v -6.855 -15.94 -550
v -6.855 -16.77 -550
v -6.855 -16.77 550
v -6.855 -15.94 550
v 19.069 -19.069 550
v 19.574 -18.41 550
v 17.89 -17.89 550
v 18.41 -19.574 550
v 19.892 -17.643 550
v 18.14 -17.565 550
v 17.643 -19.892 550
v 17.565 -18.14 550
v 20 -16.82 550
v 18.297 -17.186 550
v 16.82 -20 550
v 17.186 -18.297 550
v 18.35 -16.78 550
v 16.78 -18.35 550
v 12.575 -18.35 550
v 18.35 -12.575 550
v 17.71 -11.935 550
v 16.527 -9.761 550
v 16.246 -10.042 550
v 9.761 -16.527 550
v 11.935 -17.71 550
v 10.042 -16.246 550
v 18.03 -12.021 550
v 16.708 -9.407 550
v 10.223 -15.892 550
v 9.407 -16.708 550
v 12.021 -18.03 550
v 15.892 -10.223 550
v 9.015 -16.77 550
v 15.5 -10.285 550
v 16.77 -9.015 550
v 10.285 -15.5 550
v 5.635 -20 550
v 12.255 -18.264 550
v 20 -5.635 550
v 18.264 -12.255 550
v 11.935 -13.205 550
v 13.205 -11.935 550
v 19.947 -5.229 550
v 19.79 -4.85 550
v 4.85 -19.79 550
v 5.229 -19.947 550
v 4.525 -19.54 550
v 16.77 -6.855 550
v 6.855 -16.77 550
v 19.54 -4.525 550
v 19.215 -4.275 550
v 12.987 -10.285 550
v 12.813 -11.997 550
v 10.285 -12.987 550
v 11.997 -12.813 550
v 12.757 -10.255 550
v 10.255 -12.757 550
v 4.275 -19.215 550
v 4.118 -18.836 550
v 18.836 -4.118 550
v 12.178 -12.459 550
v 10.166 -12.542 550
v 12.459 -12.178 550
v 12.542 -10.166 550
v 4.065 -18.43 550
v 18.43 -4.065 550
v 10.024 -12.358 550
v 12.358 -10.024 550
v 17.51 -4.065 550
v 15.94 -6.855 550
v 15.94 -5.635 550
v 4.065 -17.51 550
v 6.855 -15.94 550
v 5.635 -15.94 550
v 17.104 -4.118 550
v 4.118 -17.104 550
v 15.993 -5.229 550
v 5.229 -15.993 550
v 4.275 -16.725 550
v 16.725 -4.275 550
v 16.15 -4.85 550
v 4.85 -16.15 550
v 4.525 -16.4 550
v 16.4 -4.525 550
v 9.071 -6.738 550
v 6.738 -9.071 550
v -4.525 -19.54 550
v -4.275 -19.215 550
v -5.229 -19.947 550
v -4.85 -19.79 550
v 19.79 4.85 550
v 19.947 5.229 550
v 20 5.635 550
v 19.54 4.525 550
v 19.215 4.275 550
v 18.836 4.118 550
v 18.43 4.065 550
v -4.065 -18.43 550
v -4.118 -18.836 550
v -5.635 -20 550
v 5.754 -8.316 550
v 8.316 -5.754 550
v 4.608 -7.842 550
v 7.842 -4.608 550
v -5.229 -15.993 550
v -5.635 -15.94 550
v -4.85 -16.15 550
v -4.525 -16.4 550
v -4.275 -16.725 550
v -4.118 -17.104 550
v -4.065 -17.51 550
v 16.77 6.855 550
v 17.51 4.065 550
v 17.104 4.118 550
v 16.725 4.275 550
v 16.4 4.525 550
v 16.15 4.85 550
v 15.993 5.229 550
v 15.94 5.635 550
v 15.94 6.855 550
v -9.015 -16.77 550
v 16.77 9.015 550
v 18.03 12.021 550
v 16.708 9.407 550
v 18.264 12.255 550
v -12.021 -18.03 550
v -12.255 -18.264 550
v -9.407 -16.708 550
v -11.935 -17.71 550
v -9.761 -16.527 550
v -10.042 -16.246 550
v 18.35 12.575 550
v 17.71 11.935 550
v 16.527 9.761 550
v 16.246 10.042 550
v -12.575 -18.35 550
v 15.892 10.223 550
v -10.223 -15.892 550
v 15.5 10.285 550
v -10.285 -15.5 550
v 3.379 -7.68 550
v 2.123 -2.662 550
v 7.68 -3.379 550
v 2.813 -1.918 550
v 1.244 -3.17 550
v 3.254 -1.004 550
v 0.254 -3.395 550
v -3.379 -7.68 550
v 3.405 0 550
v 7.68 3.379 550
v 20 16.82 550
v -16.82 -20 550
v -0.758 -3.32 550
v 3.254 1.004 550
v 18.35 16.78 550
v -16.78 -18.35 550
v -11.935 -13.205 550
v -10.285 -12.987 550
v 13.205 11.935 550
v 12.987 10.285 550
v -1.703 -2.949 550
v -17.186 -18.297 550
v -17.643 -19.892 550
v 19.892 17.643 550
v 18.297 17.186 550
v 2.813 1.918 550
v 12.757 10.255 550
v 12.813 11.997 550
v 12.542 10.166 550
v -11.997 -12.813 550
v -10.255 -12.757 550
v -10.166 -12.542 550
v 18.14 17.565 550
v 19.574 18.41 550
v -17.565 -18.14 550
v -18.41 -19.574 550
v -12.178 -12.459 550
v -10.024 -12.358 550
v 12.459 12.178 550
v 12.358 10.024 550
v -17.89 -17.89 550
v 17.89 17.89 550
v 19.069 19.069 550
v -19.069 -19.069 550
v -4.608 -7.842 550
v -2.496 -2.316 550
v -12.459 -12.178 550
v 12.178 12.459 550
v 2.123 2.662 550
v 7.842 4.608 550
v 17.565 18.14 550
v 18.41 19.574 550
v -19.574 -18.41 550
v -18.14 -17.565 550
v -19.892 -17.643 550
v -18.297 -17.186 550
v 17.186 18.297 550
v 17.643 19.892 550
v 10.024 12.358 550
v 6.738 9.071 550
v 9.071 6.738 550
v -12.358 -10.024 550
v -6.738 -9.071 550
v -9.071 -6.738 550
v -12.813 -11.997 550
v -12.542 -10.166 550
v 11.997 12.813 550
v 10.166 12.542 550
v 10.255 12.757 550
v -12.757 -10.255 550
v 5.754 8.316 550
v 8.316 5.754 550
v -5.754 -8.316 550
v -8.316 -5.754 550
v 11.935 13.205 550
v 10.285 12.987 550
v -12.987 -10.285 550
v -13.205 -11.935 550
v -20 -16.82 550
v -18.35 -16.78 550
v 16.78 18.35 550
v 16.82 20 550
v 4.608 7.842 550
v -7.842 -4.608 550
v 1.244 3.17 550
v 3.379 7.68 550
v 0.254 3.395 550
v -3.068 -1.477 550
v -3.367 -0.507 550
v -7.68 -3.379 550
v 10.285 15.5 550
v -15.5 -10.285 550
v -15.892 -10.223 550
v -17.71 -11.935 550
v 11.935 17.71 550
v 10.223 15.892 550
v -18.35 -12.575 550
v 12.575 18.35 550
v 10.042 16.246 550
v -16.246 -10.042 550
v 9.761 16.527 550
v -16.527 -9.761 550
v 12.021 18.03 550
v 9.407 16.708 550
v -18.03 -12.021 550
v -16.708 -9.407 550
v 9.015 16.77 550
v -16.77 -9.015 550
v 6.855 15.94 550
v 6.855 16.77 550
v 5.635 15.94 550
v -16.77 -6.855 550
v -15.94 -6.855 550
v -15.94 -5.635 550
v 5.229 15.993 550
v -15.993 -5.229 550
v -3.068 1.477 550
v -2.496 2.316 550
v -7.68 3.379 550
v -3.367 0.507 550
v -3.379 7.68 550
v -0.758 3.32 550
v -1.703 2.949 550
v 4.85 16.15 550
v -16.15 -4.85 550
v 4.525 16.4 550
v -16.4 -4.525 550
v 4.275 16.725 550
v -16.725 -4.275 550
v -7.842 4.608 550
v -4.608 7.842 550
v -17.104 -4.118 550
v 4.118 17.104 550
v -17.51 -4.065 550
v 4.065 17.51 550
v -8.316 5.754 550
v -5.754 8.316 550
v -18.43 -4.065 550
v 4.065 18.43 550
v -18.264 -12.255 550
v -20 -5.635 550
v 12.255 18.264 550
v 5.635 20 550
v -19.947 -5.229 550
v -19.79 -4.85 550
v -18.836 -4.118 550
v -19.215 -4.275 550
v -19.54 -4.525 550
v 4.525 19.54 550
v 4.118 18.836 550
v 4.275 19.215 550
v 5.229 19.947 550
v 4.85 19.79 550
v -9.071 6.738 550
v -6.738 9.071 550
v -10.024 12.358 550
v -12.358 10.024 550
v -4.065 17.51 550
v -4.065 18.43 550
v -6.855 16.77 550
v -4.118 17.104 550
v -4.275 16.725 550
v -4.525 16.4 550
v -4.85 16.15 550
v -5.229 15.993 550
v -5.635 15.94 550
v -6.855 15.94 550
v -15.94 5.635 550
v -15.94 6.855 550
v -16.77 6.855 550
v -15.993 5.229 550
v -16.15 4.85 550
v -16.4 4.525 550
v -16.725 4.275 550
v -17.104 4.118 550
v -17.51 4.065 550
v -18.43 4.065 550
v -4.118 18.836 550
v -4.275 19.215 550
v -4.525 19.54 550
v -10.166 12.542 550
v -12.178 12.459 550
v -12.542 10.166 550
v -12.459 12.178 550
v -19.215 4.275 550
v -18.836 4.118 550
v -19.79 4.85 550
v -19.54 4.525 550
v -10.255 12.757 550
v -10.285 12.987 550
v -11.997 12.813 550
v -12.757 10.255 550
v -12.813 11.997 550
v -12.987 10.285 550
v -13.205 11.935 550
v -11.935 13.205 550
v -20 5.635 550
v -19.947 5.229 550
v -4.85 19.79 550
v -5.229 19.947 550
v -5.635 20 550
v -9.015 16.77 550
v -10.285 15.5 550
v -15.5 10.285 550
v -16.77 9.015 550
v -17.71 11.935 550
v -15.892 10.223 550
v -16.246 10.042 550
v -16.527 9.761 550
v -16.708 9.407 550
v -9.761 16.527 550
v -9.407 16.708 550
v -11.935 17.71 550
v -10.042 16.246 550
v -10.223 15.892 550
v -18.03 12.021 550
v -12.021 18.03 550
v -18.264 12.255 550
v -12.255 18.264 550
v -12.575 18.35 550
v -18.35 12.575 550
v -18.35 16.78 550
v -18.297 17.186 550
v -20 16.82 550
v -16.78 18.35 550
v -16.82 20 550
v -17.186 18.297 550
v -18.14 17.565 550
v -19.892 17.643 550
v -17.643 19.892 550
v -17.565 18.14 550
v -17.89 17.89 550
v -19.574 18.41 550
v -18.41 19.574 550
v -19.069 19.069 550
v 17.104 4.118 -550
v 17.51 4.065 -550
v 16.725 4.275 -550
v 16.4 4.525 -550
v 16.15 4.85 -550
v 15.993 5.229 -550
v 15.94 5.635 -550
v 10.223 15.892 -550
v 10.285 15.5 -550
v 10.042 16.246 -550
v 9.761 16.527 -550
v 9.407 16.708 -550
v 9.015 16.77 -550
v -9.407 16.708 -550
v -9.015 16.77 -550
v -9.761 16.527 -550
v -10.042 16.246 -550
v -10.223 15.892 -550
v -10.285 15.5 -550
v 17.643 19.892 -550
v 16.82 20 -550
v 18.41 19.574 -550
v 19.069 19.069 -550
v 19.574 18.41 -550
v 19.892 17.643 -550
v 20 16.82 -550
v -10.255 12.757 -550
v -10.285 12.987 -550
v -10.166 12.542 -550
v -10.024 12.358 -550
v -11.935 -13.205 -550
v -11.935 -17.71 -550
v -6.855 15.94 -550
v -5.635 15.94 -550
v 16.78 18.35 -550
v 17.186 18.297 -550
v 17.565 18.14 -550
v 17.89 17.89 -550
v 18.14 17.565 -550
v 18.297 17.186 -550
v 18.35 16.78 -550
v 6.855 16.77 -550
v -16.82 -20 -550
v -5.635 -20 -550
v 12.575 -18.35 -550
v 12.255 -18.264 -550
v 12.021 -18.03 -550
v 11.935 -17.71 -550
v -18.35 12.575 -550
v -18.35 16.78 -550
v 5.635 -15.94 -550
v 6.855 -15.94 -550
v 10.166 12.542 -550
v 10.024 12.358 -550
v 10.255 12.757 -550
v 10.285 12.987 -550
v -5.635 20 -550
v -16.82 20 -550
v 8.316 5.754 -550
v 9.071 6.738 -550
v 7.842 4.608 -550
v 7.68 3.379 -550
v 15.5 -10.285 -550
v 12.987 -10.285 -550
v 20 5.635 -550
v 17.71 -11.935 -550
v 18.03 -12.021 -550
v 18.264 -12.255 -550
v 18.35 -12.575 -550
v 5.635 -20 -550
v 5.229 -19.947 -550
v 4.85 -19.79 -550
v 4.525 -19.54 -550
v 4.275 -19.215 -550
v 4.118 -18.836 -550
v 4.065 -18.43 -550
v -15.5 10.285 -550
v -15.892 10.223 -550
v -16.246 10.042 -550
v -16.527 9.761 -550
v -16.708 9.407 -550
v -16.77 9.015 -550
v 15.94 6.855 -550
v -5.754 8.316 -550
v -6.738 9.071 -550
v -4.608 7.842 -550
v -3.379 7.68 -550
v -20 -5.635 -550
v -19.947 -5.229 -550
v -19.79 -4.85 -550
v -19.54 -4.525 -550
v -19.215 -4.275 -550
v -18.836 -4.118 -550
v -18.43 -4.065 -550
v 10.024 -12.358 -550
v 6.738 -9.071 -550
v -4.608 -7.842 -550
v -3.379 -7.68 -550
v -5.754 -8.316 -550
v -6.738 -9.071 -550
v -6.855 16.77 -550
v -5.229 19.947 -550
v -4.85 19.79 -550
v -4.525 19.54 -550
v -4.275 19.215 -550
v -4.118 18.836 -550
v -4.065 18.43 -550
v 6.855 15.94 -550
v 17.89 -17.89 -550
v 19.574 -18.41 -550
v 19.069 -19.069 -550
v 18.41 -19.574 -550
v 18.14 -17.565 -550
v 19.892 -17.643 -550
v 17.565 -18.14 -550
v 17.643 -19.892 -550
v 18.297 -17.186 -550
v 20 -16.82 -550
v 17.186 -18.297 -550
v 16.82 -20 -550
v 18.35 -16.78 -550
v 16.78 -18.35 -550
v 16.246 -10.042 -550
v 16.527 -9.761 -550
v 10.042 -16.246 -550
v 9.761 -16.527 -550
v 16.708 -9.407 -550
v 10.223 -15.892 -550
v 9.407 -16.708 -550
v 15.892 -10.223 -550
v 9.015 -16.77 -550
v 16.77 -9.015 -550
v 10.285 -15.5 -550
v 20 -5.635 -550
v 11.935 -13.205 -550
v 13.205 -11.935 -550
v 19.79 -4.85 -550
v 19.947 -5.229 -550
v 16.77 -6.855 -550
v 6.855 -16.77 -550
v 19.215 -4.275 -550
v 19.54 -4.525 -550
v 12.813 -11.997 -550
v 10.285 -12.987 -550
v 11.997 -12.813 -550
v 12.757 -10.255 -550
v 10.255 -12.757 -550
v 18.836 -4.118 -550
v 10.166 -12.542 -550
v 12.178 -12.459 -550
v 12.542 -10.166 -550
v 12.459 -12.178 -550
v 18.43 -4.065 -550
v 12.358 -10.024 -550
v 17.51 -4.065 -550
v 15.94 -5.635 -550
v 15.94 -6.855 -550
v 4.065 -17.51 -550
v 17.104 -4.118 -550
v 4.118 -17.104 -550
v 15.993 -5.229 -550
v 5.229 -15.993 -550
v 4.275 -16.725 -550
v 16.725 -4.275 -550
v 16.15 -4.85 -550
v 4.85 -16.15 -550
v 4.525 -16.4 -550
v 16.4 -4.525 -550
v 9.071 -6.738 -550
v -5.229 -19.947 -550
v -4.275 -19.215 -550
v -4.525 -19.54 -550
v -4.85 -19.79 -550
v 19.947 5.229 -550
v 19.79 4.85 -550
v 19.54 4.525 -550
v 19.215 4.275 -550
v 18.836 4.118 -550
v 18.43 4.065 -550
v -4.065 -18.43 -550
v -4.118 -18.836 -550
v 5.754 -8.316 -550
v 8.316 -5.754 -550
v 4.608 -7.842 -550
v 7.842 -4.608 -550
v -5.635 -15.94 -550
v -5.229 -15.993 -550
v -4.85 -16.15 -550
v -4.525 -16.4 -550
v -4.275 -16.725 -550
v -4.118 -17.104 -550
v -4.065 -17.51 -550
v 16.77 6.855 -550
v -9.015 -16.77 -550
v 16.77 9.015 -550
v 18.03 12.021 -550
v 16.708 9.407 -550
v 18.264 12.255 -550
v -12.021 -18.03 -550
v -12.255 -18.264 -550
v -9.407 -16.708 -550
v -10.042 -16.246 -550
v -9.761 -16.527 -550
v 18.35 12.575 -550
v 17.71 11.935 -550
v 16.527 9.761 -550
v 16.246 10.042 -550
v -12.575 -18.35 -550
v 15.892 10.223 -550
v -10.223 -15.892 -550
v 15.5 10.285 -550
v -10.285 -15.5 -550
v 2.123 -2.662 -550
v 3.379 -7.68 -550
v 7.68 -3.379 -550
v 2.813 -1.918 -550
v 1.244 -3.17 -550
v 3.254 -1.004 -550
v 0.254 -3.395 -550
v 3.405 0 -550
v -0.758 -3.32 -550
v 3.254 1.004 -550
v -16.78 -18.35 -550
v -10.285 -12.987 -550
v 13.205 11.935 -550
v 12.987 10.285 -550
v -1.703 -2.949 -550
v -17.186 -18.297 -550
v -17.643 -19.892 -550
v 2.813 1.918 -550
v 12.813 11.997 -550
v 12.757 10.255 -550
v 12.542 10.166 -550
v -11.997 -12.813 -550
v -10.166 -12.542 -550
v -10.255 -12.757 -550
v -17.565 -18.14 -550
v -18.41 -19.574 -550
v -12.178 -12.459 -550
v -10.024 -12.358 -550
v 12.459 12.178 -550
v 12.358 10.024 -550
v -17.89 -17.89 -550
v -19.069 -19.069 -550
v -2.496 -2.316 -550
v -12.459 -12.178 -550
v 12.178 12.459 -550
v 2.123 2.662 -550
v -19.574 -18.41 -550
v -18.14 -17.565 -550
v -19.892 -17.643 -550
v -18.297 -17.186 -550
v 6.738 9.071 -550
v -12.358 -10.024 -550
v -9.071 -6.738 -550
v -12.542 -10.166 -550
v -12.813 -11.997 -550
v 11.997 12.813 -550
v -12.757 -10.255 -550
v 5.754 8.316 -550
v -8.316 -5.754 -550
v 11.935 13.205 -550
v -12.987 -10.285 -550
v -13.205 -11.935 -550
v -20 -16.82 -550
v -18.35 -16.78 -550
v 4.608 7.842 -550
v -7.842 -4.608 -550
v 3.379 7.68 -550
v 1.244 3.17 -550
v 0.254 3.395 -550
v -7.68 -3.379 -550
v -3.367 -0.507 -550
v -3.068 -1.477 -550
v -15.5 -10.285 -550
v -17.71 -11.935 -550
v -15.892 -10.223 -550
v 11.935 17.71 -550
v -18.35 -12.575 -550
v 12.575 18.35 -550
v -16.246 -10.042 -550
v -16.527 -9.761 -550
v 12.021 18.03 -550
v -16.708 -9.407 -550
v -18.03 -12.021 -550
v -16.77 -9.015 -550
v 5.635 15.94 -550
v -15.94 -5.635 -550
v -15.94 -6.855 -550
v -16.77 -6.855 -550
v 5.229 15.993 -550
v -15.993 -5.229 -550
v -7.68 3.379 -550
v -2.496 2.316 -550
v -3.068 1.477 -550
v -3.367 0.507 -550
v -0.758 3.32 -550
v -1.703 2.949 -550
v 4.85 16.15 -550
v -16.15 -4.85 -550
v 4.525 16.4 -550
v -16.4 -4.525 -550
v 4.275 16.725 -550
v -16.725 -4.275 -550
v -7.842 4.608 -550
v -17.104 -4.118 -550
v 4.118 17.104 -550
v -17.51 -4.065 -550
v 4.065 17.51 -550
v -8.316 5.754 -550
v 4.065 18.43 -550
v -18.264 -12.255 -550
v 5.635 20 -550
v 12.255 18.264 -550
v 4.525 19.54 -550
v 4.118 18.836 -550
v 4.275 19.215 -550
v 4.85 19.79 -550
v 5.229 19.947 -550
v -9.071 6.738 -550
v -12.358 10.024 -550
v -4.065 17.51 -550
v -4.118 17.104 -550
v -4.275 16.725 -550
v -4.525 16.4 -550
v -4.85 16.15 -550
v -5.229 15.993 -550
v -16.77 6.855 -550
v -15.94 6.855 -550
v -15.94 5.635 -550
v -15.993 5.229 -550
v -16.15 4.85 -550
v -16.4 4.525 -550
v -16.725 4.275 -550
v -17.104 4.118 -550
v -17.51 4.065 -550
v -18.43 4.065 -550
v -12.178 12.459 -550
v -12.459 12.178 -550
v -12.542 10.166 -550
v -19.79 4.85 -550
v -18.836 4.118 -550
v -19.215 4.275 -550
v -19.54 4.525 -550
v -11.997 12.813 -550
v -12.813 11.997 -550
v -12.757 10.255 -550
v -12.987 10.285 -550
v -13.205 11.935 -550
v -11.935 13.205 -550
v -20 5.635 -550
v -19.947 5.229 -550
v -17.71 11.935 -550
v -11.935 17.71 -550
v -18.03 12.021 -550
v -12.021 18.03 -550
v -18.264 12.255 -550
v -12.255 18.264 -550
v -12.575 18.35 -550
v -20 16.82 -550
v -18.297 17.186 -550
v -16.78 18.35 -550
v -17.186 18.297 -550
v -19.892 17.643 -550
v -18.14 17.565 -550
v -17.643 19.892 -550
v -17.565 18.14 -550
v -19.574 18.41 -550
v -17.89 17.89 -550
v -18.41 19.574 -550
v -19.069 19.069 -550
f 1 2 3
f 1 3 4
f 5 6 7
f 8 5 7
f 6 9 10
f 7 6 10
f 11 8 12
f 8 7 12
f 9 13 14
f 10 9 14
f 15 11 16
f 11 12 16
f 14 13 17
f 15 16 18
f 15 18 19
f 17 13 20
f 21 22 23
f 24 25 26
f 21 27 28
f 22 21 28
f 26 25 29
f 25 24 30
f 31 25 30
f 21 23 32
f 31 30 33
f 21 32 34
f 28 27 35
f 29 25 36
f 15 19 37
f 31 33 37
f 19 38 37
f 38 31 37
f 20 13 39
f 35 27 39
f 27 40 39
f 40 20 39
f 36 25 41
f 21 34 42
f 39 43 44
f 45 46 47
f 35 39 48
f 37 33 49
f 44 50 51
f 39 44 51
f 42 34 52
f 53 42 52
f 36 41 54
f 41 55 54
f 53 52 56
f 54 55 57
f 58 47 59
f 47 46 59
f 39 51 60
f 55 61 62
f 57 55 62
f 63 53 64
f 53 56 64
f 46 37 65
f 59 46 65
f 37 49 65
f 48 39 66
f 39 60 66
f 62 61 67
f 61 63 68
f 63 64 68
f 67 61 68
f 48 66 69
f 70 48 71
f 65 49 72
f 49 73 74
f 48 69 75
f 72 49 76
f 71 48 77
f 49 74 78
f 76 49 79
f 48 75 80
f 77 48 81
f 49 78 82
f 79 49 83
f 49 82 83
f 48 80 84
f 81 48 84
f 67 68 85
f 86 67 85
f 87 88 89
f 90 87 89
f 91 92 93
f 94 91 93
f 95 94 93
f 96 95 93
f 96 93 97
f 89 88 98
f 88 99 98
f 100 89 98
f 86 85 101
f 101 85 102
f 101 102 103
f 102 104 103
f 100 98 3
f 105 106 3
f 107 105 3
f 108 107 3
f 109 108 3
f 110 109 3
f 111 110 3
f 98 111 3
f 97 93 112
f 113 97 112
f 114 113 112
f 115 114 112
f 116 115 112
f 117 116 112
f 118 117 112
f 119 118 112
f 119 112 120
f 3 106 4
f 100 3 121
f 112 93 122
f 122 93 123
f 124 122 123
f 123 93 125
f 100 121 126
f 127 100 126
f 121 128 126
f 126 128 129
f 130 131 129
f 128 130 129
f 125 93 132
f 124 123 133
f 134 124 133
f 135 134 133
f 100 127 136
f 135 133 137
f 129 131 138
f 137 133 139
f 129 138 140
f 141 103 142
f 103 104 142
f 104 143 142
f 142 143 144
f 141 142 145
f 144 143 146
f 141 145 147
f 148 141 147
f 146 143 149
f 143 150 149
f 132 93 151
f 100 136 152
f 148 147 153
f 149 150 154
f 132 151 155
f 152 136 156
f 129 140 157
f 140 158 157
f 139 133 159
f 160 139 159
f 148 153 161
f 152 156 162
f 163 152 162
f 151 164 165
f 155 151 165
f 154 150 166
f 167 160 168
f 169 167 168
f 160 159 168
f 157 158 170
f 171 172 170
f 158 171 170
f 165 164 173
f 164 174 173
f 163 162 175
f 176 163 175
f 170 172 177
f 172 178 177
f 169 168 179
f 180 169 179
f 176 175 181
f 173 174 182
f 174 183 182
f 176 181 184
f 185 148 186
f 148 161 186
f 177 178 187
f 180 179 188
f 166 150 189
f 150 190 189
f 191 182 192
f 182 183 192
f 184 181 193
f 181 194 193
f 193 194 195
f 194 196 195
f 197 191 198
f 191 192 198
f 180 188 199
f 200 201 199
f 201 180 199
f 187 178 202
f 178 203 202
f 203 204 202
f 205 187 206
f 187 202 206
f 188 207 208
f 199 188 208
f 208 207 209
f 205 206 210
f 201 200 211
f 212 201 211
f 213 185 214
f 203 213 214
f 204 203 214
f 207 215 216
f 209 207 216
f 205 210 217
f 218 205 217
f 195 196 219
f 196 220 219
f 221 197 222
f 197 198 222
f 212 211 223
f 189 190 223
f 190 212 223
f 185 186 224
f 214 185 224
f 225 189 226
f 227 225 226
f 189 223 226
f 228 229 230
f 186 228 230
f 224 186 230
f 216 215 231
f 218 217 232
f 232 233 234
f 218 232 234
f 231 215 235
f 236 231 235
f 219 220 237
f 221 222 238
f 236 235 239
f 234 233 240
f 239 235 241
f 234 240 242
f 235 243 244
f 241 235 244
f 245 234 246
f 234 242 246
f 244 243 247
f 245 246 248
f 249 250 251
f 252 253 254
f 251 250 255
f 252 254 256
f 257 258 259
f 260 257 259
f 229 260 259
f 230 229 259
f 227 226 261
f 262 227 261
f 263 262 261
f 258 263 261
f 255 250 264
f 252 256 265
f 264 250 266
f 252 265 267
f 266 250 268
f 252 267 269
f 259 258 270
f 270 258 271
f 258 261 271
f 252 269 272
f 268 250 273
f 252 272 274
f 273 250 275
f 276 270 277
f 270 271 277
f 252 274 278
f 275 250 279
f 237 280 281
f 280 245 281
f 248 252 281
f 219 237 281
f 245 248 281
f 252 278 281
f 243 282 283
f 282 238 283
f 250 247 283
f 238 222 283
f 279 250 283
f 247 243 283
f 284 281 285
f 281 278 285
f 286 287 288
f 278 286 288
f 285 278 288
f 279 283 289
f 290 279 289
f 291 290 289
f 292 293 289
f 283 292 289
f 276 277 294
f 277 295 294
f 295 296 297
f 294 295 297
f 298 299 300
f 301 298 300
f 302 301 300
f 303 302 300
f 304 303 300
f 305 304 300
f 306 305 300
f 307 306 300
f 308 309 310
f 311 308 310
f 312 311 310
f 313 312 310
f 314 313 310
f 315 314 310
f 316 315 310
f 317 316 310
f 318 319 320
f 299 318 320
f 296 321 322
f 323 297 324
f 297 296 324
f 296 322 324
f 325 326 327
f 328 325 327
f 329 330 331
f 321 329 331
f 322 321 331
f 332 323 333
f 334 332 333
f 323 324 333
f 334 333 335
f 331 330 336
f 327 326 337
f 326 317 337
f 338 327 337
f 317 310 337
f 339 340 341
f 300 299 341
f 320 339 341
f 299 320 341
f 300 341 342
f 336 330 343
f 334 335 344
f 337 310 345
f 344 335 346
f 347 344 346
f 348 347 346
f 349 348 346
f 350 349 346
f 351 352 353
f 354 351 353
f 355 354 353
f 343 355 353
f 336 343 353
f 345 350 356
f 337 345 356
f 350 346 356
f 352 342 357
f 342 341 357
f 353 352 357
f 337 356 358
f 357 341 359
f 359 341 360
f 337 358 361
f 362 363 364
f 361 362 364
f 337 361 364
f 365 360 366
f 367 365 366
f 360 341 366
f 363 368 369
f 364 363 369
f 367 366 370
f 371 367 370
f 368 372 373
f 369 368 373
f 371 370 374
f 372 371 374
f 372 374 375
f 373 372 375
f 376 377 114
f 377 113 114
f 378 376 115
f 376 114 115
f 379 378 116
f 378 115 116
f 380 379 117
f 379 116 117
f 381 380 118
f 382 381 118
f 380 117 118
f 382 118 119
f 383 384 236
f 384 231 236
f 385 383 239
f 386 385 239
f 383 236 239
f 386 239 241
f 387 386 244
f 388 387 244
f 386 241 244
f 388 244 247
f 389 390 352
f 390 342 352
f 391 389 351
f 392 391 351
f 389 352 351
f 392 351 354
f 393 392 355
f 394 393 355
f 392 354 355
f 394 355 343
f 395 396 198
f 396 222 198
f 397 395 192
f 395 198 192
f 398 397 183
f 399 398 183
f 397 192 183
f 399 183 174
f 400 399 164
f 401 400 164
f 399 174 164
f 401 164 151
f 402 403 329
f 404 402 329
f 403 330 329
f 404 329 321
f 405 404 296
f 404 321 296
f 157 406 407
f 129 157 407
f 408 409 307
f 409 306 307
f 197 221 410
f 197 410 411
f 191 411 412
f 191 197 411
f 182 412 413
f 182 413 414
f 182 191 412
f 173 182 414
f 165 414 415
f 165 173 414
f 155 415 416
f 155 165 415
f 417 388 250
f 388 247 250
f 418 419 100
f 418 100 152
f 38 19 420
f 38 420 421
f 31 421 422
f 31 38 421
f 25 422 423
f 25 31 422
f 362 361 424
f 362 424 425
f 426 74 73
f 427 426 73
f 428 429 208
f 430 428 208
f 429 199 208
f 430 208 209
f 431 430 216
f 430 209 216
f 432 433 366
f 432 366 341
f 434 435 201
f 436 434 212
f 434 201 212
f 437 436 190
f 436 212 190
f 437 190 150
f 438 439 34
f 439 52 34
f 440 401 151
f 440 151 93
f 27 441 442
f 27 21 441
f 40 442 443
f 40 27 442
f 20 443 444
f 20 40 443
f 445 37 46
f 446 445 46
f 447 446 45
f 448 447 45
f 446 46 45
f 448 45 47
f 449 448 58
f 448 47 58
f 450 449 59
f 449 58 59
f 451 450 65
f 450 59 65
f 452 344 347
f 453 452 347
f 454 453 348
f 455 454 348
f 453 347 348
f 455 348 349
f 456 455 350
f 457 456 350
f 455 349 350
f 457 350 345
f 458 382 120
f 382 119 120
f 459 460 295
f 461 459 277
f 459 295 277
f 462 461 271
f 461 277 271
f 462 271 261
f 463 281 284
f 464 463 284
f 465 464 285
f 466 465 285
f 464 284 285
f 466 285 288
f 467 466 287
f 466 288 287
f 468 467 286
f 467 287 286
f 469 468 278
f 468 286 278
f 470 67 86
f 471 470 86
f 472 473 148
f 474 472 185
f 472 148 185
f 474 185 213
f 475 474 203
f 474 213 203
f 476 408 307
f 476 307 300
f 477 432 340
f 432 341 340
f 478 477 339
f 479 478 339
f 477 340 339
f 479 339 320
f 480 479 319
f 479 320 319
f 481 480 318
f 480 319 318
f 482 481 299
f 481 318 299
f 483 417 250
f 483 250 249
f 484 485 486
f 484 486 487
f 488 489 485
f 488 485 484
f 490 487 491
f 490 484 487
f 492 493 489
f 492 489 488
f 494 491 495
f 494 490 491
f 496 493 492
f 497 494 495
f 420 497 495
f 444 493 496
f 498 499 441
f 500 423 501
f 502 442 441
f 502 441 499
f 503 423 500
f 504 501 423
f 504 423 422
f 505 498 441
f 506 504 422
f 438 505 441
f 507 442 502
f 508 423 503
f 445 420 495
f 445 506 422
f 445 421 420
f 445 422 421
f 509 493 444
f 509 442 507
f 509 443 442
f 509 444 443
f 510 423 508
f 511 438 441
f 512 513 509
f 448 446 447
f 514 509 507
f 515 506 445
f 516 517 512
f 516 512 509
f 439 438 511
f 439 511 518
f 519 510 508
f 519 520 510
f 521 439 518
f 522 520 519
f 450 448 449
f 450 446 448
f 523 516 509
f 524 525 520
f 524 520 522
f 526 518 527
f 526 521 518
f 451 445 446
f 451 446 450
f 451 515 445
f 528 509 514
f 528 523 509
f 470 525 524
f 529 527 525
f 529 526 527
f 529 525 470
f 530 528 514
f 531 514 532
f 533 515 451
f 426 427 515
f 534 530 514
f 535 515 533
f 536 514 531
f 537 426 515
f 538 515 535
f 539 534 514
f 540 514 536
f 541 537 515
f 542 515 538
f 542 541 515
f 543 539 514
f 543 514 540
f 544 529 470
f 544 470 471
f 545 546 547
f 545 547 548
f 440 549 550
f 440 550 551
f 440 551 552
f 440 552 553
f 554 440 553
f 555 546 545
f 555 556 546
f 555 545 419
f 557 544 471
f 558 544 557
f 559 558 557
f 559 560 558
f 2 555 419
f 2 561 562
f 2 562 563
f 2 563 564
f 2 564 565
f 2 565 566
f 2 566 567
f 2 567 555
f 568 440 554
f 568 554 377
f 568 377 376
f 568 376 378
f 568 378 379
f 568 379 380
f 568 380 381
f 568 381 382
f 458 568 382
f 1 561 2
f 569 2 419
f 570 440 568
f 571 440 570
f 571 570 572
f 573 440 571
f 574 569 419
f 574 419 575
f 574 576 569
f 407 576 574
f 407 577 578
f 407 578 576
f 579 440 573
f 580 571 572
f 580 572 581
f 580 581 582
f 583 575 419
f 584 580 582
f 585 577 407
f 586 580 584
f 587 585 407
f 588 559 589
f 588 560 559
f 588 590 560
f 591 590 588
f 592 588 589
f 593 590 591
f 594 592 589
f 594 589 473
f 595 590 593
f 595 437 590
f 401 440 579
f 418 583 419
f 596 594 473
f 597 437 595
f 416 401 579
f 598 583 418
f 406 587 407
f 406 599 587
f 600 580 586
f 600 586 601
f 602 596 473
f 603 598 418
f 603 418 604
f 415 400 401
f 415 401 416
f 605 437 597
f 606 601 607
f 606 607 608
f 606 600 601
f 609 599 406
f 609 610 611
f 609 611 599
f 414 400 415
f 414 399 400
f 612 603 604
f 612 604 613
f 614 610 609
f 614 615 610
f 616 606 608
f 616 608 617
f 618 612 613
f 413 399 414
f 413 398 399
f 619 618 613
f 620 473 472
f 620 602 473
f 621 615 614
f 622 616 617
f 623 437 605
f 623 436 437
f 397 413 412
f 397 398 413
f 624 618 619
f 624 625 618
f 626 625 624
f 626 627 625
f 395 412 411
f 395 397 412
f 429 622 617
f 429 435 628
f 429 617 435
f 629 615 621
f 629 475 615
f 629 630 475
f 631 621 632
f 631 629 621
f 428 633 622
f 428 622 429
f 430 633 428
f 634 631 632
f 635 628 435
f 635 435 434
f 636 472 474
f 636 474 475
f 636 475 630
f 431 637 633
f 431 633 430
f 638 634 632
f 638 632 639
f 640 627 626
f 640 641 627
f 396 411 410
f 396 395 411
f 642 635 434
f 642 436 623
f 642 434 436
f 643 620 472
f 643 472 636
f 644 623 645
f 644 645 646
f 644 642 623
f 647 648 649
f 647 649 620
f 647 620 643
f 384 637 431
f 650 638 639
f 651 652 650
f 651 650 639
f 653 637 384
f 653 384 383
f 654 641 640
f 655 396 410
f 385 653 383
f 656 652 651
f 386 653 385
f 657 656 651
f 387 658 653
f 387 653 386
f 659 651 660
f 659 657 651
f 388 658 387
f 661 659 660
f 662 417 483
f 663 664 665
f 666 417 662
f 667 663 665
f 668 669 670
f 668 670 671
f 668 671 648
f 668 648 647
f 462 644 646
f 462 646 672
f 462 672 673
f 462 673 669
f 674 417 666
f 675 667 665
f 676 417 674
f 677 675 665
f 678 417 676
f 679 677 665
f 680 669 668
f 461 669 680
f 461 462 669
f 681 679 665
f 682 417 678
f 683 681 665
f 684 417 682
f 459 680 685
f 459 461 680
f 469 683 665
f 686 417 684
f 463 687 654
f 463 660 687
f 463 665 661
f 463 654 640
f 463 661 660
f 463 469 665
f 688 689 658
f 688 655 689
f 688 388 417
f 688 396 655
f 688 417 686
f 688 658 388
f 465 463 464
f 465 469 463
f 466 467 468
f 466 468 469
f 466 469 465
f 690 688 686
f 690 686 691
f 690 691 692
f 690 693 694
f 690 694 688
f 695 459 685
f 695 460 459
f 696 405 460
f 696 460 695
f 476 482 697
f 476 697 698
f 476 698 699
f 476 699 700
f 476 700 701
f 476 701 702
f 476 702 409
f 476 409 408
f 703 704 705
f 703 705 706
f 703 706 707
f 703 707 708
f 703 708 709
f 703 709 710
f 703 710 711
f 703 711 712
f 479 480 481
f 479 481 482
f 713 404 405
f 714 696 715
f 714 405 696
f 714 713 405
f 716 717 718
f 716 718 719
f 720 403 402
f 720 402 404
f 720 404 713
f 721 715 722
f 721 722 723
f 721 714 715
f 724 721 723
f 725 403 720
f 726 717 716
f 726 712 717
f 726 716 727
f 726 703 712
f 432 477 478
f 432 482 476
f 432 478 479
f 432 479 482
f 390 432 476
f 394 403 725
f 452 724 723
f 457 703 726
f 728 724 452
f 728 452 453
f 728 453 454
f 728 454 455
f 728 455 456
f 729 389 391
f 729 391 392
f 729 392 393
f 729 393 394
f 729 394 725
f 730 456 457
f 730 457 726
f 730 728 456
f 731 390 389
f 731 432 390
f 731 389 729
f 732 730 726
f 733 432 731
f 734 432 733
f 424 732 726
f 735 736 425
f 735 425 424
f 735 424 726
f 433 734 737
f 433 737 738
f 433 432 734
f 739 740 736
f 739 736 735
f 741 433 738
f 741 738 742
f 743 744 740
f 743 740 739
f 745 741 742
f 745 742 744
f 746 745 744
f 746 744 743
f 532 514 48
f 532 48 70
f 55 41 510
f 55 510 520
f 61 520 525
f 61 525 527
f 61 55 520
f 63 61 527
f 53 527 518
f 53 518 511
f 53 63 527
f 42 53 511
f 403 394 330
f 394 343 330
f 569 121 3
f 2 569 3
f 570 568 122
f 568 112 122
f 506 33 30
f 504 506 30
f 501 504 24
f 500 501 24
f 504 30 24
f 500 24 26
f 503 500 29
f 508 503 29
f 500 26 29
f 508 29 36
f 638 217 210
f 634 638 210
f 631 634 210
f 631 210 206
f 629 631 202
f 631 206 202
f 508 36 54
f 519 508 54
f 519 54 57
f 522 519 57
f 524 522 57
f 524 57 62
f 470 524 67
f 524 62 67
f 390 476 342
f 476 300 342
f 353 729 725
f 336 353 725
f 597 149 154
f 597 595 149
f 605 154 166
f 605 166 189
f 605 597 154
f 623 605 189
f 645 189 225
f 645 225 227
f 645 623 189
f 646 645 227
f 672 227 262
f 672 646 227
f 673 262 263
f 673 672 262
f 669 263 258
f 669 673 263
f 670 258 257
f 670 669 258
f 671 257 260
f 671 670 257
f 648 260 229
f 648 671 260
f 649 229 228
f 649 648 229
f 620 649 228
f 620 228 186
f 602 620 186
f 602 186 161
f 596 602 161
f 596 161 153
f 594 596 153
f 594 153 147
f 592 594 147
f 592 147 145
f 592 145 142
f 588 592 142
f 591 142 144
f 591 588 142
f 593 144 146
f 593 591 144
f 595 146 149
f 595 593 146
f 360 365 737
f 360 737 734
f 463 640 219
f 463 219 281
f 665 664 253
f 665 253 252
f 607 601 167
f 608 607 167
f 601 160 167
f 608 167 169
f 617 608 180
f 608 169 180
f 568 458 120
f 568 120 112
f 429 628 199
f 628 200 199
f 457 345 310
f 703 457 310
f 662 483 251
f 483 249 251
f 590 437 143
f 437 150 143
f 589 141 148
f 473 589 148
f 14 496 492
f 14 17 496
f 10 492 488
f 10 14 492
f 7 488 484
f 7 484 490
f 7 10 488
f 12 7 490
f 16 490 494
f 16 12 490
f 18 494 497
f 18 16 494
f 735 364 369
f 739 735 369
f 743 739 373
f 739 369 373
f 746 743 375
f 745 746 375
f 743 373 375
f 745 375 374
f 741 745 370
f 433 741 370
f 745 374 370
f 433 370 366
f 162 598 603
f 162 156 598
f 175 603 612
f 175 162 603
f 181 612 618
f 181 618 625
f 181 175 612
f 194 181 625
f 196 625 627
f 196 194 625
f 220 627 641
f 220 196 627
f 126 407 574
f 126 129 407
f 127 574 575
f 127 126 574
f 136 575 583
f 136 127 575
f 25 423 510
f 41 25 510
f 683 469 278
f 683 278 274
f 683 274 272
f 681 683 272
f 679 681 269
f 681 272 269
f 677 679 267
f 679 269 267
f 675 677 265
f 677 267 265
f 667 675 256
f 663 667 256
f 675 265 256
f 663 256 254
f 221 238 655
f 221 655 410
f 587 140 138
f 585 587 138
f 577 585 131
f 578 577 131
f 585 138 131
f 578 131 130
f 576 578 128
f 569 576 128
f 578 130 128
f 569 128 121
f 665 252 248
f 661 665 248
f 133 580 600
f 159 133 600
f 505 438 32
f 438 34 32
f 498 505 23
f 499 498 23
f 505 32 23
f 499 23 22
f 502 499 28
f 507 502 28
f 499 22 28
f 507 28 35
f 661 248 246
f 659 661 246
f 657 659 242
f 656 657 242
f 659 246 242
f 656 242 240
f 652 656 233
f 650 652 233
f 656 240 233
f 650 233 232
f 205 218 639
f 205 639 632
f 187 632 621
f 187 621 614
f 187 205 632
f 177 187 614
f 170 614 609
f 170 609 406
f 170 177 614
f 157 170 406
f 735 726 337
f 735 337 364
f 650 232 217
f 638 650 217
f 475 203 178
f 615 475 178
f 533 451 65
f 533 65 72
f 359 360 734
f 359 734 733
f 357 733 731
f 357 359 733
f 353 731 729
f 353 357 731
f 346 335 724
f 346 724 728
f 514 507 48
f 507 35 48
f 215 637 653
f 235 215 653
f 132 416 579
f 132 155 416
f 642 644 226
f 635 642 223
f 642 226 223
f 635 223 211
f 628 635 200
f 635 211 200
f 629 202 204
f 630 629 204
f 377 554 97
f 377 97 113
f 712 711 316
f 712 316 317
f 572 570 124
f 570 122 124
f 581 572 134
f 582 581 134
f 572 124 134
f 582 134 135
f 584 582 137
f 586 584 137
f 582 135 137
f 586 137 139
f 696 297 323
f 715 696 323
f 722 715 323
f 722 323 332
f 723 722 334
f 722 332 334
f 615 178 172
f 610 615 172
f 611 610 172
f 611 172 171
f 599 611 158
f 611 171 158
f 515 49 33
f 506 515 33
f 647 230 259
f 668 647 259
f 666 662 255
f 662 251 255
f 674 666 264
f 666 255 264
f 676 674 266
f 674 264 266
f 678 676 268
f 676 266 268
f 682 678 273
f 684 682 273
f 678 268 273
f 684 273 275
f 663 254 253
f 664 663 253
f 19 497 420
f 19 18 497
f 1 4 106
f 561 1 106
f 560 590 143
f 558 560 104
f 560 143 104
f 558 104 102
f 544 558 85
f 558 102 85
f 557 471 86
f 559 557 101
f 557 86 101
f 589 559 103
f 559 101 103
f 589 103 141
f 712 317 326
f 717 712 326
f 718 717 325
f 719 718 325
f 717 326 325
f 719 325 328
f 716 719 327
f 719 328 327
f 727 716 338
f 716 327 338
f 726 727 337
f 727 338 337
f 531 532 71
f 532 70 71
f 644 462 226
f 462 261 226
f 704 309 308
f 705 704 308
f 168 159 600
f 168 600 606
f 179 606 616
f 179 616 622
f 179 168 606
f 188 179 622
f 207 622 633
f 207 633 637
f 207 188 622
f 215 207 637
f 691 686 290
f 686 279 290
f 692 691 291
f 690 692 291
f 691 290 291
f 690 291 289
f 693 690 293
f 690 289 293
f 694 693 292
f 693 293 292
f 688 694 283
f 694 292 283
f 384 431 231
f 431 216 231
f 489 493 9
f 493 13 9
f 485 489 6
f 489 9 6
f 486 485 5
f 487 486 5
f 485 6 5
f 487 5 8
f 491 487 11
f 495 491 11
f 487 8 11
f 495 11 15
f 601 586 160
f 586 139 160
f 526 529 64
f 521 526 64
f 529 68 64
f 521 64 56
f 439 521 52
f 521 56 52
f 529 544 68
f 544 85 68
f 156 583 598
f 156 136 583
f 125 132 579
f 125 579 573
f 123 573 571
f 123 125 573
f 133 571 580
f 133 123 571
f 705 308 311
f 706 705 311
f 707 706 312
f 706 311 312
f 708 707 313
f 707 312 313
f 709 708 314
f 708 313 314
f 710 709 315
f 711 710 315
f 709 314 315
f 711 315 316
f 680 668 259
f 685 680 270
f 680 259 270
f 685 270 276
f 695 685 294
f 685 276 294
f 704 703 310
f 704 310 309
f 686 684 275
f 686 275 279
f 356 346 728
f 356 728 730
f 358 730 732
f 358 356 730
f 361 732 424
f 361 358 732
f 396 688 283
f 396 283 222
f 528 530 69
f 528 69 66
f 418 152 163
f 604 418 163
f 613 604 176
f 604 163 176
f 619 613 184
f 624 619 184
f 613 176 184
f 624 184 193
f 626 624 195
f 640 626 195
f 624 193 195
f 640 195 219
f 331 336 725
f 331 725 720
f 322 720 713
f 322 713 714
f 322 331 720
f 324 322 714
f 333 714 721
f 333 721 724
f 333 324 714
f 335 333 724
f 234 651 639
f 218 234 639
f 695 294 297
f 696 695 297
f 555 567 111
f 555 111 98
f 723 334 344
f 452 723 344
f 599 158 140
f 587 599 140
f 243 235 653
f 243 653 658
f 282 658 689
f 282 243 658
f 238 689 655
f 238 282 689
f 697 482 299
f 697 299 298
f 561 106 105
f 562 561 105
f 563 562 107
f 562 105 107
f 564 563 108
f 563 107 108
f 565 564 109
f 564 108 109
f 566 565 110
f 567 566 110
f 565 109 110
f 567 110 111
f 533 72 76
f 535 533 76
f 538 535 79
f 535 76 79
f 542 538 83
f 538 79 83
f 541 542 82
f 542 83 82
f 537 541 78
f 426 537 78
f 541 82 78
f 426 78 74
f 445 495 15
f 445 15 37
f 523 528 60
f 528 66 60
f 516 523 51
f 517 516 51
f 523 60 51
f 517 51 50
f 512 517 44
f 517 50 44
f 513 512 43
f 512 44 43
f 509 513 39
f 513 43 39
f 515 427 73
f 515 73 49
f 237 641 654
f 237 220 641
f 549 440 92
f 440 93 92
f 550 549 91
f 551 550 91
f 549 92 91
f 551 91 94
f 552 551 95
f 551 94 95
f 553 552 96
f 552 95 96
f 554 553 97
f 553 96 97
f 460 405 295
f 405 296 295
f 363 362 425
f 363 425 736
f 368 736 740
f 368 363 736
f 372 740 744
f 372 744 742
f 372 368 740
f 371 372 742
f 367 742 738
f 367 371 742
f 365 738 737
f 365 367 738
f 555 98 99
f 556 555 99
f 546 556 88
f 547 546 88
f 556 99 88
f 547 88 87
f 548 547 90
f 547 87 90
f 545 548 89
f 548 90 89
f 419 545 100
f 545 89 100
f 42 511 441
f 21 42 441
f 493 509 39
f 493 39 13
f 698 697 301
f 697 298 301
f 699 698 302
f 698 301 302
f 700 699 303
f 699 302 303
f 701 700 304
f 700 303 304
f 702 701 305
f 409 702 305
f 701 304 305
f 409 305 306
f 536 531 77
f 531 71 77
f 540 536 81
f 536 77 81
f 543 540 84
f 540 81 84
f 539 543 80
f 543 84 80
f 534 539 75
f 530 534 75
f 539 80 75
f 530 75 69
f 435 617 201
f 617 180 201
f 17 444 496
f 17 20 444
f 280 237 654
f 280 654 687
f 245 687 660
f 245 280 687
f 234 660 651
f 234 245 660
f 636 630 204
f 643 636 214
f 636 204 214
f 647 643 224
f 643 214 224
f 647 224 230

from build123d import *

# Parameters (mm, degrees)
SKETCH2_R      = 3.405
EXTRUDE1_DEPTH = 550


with BuildPart() as part:
    # Sketch2 → Extrude1 (new, symmetric)
    with BuildSketch(Plane.XY):
        with BuildLine():
            Line((-16.82, 20), (-5.635, 20))
            ThreePointArc((-5.635, 20), (-4.524842354, 19.540157646), (-4.065, 18.43))
            Line((-4.065, 18.43), (-4.065, 17.51))
            ThreePointArc((-4.065, 17.51), (-4.524842354, 16.399842354), (-5.635, 15.94))
            Line((-5.635, 15.94), (-6.855, 15.94))
            Line((-6.855, 15.94), (-6.855, 16.77))
            Line((-6.855, 16.77), (-9.015, 16.77))
            ThreePointArc((-9.015, 16.77), (-9.913025612, 16.398025612), (-10.285, 15.5))
            Line((-10.285, 15.5), (-10.285, 12.987102448))
            ThreePointArc((-10.285, 12.987102448), (-10.217252784, 12.646514194), (-10.024325035, 12.357777413))
            Line((-10.024325035, 12.357777413), (-6.737790411, 9.071242789))
            ThreePointArc((-6.737790411, 9.071242789), (-5.196779505, 8.041572221), (-3.379033201, 7.68))
            Line((-3.379033201, 7.68), (3.379033201, 7.68))
            ThreePointArc((3.379033201, 7.68), (5.196779505, 8.041572221), (6.737790411, 9.071242789))
            Line((6.737790411, 9.071242789), (10.024325035, 12.357777413))
            ThreePointArc((10.024325035, 12.357777413), (10.217252784, 12.646514194), (10.285, 12.987102448))
            Line((10.285, 12.987102448), (10.285, 15.5))
            ThreePointArc((10.285, 15.5), (9.913025612, 16.398025612), (9.015, 16.77))
            Line((9.015, 16.77), (6.855, 16.77))
            Line((6.855, 16.77), (6.855, 15.94))
            Line((6.855, 15.94), (5.635, 15.94))
            ThreePointArc((5.635, 15.94), (4.524842354, 16.399842354), (4.065, 17.51))
            Line((4.065, 17.51), (4.065, 18.43))
            ThreePointArc((4.065, 18.43), (4.524842354, 19.540157646), (5.635, 20))
            Line((5.635, 20), (16.82, 20))
            ThreePointArc((16.82, 20), (19.068599564, 19.068599564), (20, 16.82))
            Line((20, 16.82), (20, 5.635))
            ThreePointArc((20, 5.635), (19.540157646, 4.524842354), (18.43, 4.065))
            Line((18.43, 4.065), (17.51, 4.065))
            ThreePointArc((17.51, 4.065), (16.399842354, 4.524842354), (15.94, 5.635))
            Line((15.94, 5.635), (15.94, 6.855))
            Line((15.94, 6.855), (16.77, 6.855))
            Line((16.77, 6.855), (16.77, 9.015))
            ThreePointArc((16.77, 9.015), (16.398025612, 9.913025612), (15.5, 10.285))
            Line((15.5, 10.285), (12.987102448, 10.285))
            ThreePointArc((12.987102448, 10.285), (12.646514194, 10.217252784), (12.357777413, 10.024325035))
            Line((12.357777413, 10.024325035), (9.071242789, 6.737790411))
            ThreePointArc((9.071242789, 6.737790411), (8.041572221, 5.196779505), (7.68, 3.379033201))
            Line((7.68, 3.379033201), (7.68, -3.379033201))
            ThreePointArc((7.68, -3.379033201), (8.041572221, -5.196779505), (9.071242789, -6.737790411))
            Line((9.071242789, -6.737790411), (12.357777413, -10.024325035))
            ThreePointArc((12.357777413, -10.024325035), (12.646514194, -10.217252784), (12.987102448, -10.285))
            Line((12.987102448, -10.285), (15.5, -10.285))
            ThreePointArc((15.5, -10.285), (16.398025612, -9.913025612), (16.77, -9.015))
            Line((16.77, -9.015), (16.77, -6.855))
            Line((16.77, -6.855), (15.94, -6.855))
            Line((15.94, -6.855), (15.94, -5.635))
            ThreePointArc((15.94, -5.635), (16.399842354, -4.524842354), (17.51, -4.065))
            Line((17.51, -4.065), (18.43, -4.065))
            ThreePointArc((18.43, -4.065), (19.540157646, -4.524842354), (20, -5.635))
            Line((20, -5.635), (20, -16.82))
            ThreePointArc((20, -16.82), (19.068599564, -19.068599564), (16.82, -20))
            Line((16.82, -20), (5.635, -20))
            ThreePointArc((5.635, -20), (4.524842354, -19.540157646), (4.065, -18.43))
            Line((4.065, -18.43), (4.065, -17.51))
            ThreePointArc((4.065, -17.51), (4.524842354, -16.399842354), (5.635, -15.94))
            Line((5.635, -15.94), (6.855, -15.94))
            Line((6.855, -15.94), (6.855, -16.77))
            Line((6.855, -16.77), (9.015, -16.77))
            ThreePointArc((9.015, -16.77), (9.913025612, -16.398025612), (10.285, -15.5))
            Line((10.285, -15.5), (10.285, -12.987102448))
            ThreePointArc((10.285, -12.987102448), (10.217252784, -12.646514194), (10.024325035, -12.357777413))
            Line((10.024325035, -12.357777413), (6.737790411, -9.071242789))
            ThreePointArc((6.737790411, -9.071242789), (5.196779505, -8.041572221), (3.379033201, -7.68))
            Line((3.379033201, -7.68), (-3.379033201, -7.68))
            ThreePointArc((-3.379033201, -7.68), (-5.196779505, -8.041572221), (-6.737790411, -9.071242789))
            Line((-6.737790411, -9.071242789), (-10.024325035, -12.357777413))
            ThreePointArc((-10.024325035, -12.357777413), (-10.217252784, -12.646514194), (-10.285, -12.987102448))
            Line((-10.285, -12.987102448), (-10.285, -15.5))
            ThreePointArc((-10.285, -15.5), (-9.913025612, -16.398025612), (-9.015, -16.77))
            Line((-9.015, -16.77), (-6.855, -16.77))
            Line((-6.855, -16.77), (-6.855, -15.94))
            Line((-6.855, -15.94), (-5.635, -15.94))
            ThreePointArc((-5.635, -15.94), (-4.524842354, -16.399842354), (-4.065, -17.51))
            Line((-4.065, -17.51), (-4.065, -18.43))
            ThreePointArc((-4.065, -18.43), (-4.524842354, -19.540157646), (-5.635, -20))
            Line((-5.635, -20), (-16.82, -20))
            ThreePointArc((-16.82, -20), (-19.068599564, -19.068599564), (-20, -16.82))
            Line((-20, -16.82), (-20, -5.635))
            ThreePointArc((-20, -5.635), (-19.540157646, -4.524842354), (-18.43, -4.065))
            Line((-18.43, -4.065), (-17.51, -4.065))
            ThreePointArc((-17.51, -4.065), (-16.399842354, -4.524842354), (-15.94, -5.635))
            Line((-15.94, -5.635), (-15.94, -6.855))
            Line((-15.94, -6.855), (-16.77, -6.855))
            Line((-16.77, -6.855), (-16.77, -9.015))
            ThreePointArc((-16.77, -9.015), (-16.398025612, -9.913025612), (-15.5, -10.285))
            Line((-15.5, -10.285), (-12.987102448, -10.285))
            ThreePointArc((-12.987102448, -10.285), (-12.646514194, -10.217252784), (-12.357777413, -10.024325035))
            Line((-12.357777413, -10.024325035), (-9.071242789, -6.737790411))
            ThreePointArc((-9.071242789, -6.737790411), (-8.041572221, -5.196779505), (-7.68, -3.379033201))
            Line((-7.68, -3.379033201), (-7.68, 3.379033201))
            ThreePointArc((-7.68, 3.379033201), (-8.041572221, 5.196779505), (-9.071242789, 6.737790411))
            Line((-9.071242789, 6.737790411), (-12.357777413, 10.024325035))
            ThreePointArc((-12.357777413, 10.024325035), (-12.646514194, 10.217252784), (-12.987102448, 10.285))
            Line((-12.987102448, 10.285), (-15.5, 10.285))
            ThreePointArc((-15.5, 10.285), (-16.398025612, 9.913025612), (-16.77, 9.015))
            Line((-16.77, 9.015), (-16.77, 6.855))
            Line((-16.77, 6.855), (-15.94, 6.855))
            Line((-15.94, 6.855), (-15.94, 5.635))
            ThreePointArc((-15.94, 5.635), (-16.399842354, 4.524842354), (-17.51, 4.065))
            Line((-17.51, 4.065), (-18.43, 4.065))
            ThreePointArc((-18.43, 4.065), (-19.540157646, 4.524842354), (-20, 5.635))
            Line((-20, 5.635), (-20, 16.82))
            ThreePointArc((-20, 16.82), (-19.068599564, 19.068599564), (-16.82, 20))
        make_face()
        Circle(SKETCH2_R, mode=Mode.SUBTRACT)
        with BuildLine():
            Line((-16.78, 18.35), (-12.575, 18.35))
            ThreePointArc((-12.575, 18.35), (-12.12245166, 18.16254834), (-11.935, 17.71))
            Line((-11.935, 17.71), (-11.935, 13.205))
            ThreePointArc((-11.935, 13.205), (-12.306974388, 12.306974388), (-13.205, 11.935))
            Line((-13.205, 11.935), (-17.71, 11.935))
            ThreePointArc((-17.71, 11.935), (-18.16254834, 12.12245166), (-18.35, 12.575))
            Line((-18.35, 12.575), (-18.35, 16.78))
            ThreePointArc((-18.35, 16.78), (-17.890157646, 17.890157646), (-16.78, 18.35))
        make_face(mode=Mode.SUBTRACT)
        with BuildLine():
            Line((-18.35, -16.78), (-18.35, -12.575))
            ThreePointArc((-18.35, -12.575), (-18.16254834, -12.12245166), (-17.71, -11.935))
            Line((-17.71, -11.935), (-13.205, -11.935))
            ThreePointArc((-13.205, -11.935), (-12.306974388, -12.306974388), (-11.935, -13.205))
            Line((-11.935, -13.205), (-11.935, -17.71))
            ThreePointArc((-11.935, -17.71), (-12.12245166, -18.16254834), (-12.575, -18.35))
            Line((-12.575, -18.35), (-16.78, -18.35))
            ThreePointArc((-16.78, -18.35), (-17.890157646, -17.890157646), (-18.35, -16.78))
        make_face(mode=Mode.SUBTRACT)
        with BuildLine():
            Line((16.78, -18.35), (12.575, -18.35))
            ThreePointArc((12.575, -18.35), (12.12245166, -18.16254834), (11.935, -17.71))
            Line((11.935, -17.71), (11.935, -13.205))
            ThreePointArc((11.935, -13.205), (12.306974388, -12.306974388), (13.205, -11.935))
            Line((13.205, -11.935), (17.71, -11.935))
            ThreePointArc((17.71, -11.935), (18.16254834, -12.12245166), (18.35, -12.575))
            Line((18.35, -12.575), (18.35, -16.78))
            ThreePointArc((18.35, -16.78), (17.890157646, -17.890157646), (16.78, -18.35))
        make_face(mode=Mode.SUBTRACT)
        with BuildLine():
            Line((18.35, 16.78), (18.35, 12.575))
            ThreePointArc((18.35, 12.575), (18.16254834, 12.12245166), (17.71, 11.935))
            Line((17.71, 11.935), (13.205, 11.935))
            ThreePointArc((13.205, 11.935), (12.306974388, 12.306974388), (11.935, 13.205))
            Line((11.935, 13.205), (11.935, 17.71))
            ThreePointArc((11.935, 17.71), (12.12245166, 18.16254834), (12.575, 18.35))
            Line((12.575, 18.35), (16.78, 18.35))
            ThreePointArc((16.78, 18.35), (17.890157646, 17.890157646), (18.35, 16.78))
        make_face(mode=Mode.SUBTRACT)
    extrude(amount=EXTRUDE1_DEPTH, both=True)


solid = part.part
